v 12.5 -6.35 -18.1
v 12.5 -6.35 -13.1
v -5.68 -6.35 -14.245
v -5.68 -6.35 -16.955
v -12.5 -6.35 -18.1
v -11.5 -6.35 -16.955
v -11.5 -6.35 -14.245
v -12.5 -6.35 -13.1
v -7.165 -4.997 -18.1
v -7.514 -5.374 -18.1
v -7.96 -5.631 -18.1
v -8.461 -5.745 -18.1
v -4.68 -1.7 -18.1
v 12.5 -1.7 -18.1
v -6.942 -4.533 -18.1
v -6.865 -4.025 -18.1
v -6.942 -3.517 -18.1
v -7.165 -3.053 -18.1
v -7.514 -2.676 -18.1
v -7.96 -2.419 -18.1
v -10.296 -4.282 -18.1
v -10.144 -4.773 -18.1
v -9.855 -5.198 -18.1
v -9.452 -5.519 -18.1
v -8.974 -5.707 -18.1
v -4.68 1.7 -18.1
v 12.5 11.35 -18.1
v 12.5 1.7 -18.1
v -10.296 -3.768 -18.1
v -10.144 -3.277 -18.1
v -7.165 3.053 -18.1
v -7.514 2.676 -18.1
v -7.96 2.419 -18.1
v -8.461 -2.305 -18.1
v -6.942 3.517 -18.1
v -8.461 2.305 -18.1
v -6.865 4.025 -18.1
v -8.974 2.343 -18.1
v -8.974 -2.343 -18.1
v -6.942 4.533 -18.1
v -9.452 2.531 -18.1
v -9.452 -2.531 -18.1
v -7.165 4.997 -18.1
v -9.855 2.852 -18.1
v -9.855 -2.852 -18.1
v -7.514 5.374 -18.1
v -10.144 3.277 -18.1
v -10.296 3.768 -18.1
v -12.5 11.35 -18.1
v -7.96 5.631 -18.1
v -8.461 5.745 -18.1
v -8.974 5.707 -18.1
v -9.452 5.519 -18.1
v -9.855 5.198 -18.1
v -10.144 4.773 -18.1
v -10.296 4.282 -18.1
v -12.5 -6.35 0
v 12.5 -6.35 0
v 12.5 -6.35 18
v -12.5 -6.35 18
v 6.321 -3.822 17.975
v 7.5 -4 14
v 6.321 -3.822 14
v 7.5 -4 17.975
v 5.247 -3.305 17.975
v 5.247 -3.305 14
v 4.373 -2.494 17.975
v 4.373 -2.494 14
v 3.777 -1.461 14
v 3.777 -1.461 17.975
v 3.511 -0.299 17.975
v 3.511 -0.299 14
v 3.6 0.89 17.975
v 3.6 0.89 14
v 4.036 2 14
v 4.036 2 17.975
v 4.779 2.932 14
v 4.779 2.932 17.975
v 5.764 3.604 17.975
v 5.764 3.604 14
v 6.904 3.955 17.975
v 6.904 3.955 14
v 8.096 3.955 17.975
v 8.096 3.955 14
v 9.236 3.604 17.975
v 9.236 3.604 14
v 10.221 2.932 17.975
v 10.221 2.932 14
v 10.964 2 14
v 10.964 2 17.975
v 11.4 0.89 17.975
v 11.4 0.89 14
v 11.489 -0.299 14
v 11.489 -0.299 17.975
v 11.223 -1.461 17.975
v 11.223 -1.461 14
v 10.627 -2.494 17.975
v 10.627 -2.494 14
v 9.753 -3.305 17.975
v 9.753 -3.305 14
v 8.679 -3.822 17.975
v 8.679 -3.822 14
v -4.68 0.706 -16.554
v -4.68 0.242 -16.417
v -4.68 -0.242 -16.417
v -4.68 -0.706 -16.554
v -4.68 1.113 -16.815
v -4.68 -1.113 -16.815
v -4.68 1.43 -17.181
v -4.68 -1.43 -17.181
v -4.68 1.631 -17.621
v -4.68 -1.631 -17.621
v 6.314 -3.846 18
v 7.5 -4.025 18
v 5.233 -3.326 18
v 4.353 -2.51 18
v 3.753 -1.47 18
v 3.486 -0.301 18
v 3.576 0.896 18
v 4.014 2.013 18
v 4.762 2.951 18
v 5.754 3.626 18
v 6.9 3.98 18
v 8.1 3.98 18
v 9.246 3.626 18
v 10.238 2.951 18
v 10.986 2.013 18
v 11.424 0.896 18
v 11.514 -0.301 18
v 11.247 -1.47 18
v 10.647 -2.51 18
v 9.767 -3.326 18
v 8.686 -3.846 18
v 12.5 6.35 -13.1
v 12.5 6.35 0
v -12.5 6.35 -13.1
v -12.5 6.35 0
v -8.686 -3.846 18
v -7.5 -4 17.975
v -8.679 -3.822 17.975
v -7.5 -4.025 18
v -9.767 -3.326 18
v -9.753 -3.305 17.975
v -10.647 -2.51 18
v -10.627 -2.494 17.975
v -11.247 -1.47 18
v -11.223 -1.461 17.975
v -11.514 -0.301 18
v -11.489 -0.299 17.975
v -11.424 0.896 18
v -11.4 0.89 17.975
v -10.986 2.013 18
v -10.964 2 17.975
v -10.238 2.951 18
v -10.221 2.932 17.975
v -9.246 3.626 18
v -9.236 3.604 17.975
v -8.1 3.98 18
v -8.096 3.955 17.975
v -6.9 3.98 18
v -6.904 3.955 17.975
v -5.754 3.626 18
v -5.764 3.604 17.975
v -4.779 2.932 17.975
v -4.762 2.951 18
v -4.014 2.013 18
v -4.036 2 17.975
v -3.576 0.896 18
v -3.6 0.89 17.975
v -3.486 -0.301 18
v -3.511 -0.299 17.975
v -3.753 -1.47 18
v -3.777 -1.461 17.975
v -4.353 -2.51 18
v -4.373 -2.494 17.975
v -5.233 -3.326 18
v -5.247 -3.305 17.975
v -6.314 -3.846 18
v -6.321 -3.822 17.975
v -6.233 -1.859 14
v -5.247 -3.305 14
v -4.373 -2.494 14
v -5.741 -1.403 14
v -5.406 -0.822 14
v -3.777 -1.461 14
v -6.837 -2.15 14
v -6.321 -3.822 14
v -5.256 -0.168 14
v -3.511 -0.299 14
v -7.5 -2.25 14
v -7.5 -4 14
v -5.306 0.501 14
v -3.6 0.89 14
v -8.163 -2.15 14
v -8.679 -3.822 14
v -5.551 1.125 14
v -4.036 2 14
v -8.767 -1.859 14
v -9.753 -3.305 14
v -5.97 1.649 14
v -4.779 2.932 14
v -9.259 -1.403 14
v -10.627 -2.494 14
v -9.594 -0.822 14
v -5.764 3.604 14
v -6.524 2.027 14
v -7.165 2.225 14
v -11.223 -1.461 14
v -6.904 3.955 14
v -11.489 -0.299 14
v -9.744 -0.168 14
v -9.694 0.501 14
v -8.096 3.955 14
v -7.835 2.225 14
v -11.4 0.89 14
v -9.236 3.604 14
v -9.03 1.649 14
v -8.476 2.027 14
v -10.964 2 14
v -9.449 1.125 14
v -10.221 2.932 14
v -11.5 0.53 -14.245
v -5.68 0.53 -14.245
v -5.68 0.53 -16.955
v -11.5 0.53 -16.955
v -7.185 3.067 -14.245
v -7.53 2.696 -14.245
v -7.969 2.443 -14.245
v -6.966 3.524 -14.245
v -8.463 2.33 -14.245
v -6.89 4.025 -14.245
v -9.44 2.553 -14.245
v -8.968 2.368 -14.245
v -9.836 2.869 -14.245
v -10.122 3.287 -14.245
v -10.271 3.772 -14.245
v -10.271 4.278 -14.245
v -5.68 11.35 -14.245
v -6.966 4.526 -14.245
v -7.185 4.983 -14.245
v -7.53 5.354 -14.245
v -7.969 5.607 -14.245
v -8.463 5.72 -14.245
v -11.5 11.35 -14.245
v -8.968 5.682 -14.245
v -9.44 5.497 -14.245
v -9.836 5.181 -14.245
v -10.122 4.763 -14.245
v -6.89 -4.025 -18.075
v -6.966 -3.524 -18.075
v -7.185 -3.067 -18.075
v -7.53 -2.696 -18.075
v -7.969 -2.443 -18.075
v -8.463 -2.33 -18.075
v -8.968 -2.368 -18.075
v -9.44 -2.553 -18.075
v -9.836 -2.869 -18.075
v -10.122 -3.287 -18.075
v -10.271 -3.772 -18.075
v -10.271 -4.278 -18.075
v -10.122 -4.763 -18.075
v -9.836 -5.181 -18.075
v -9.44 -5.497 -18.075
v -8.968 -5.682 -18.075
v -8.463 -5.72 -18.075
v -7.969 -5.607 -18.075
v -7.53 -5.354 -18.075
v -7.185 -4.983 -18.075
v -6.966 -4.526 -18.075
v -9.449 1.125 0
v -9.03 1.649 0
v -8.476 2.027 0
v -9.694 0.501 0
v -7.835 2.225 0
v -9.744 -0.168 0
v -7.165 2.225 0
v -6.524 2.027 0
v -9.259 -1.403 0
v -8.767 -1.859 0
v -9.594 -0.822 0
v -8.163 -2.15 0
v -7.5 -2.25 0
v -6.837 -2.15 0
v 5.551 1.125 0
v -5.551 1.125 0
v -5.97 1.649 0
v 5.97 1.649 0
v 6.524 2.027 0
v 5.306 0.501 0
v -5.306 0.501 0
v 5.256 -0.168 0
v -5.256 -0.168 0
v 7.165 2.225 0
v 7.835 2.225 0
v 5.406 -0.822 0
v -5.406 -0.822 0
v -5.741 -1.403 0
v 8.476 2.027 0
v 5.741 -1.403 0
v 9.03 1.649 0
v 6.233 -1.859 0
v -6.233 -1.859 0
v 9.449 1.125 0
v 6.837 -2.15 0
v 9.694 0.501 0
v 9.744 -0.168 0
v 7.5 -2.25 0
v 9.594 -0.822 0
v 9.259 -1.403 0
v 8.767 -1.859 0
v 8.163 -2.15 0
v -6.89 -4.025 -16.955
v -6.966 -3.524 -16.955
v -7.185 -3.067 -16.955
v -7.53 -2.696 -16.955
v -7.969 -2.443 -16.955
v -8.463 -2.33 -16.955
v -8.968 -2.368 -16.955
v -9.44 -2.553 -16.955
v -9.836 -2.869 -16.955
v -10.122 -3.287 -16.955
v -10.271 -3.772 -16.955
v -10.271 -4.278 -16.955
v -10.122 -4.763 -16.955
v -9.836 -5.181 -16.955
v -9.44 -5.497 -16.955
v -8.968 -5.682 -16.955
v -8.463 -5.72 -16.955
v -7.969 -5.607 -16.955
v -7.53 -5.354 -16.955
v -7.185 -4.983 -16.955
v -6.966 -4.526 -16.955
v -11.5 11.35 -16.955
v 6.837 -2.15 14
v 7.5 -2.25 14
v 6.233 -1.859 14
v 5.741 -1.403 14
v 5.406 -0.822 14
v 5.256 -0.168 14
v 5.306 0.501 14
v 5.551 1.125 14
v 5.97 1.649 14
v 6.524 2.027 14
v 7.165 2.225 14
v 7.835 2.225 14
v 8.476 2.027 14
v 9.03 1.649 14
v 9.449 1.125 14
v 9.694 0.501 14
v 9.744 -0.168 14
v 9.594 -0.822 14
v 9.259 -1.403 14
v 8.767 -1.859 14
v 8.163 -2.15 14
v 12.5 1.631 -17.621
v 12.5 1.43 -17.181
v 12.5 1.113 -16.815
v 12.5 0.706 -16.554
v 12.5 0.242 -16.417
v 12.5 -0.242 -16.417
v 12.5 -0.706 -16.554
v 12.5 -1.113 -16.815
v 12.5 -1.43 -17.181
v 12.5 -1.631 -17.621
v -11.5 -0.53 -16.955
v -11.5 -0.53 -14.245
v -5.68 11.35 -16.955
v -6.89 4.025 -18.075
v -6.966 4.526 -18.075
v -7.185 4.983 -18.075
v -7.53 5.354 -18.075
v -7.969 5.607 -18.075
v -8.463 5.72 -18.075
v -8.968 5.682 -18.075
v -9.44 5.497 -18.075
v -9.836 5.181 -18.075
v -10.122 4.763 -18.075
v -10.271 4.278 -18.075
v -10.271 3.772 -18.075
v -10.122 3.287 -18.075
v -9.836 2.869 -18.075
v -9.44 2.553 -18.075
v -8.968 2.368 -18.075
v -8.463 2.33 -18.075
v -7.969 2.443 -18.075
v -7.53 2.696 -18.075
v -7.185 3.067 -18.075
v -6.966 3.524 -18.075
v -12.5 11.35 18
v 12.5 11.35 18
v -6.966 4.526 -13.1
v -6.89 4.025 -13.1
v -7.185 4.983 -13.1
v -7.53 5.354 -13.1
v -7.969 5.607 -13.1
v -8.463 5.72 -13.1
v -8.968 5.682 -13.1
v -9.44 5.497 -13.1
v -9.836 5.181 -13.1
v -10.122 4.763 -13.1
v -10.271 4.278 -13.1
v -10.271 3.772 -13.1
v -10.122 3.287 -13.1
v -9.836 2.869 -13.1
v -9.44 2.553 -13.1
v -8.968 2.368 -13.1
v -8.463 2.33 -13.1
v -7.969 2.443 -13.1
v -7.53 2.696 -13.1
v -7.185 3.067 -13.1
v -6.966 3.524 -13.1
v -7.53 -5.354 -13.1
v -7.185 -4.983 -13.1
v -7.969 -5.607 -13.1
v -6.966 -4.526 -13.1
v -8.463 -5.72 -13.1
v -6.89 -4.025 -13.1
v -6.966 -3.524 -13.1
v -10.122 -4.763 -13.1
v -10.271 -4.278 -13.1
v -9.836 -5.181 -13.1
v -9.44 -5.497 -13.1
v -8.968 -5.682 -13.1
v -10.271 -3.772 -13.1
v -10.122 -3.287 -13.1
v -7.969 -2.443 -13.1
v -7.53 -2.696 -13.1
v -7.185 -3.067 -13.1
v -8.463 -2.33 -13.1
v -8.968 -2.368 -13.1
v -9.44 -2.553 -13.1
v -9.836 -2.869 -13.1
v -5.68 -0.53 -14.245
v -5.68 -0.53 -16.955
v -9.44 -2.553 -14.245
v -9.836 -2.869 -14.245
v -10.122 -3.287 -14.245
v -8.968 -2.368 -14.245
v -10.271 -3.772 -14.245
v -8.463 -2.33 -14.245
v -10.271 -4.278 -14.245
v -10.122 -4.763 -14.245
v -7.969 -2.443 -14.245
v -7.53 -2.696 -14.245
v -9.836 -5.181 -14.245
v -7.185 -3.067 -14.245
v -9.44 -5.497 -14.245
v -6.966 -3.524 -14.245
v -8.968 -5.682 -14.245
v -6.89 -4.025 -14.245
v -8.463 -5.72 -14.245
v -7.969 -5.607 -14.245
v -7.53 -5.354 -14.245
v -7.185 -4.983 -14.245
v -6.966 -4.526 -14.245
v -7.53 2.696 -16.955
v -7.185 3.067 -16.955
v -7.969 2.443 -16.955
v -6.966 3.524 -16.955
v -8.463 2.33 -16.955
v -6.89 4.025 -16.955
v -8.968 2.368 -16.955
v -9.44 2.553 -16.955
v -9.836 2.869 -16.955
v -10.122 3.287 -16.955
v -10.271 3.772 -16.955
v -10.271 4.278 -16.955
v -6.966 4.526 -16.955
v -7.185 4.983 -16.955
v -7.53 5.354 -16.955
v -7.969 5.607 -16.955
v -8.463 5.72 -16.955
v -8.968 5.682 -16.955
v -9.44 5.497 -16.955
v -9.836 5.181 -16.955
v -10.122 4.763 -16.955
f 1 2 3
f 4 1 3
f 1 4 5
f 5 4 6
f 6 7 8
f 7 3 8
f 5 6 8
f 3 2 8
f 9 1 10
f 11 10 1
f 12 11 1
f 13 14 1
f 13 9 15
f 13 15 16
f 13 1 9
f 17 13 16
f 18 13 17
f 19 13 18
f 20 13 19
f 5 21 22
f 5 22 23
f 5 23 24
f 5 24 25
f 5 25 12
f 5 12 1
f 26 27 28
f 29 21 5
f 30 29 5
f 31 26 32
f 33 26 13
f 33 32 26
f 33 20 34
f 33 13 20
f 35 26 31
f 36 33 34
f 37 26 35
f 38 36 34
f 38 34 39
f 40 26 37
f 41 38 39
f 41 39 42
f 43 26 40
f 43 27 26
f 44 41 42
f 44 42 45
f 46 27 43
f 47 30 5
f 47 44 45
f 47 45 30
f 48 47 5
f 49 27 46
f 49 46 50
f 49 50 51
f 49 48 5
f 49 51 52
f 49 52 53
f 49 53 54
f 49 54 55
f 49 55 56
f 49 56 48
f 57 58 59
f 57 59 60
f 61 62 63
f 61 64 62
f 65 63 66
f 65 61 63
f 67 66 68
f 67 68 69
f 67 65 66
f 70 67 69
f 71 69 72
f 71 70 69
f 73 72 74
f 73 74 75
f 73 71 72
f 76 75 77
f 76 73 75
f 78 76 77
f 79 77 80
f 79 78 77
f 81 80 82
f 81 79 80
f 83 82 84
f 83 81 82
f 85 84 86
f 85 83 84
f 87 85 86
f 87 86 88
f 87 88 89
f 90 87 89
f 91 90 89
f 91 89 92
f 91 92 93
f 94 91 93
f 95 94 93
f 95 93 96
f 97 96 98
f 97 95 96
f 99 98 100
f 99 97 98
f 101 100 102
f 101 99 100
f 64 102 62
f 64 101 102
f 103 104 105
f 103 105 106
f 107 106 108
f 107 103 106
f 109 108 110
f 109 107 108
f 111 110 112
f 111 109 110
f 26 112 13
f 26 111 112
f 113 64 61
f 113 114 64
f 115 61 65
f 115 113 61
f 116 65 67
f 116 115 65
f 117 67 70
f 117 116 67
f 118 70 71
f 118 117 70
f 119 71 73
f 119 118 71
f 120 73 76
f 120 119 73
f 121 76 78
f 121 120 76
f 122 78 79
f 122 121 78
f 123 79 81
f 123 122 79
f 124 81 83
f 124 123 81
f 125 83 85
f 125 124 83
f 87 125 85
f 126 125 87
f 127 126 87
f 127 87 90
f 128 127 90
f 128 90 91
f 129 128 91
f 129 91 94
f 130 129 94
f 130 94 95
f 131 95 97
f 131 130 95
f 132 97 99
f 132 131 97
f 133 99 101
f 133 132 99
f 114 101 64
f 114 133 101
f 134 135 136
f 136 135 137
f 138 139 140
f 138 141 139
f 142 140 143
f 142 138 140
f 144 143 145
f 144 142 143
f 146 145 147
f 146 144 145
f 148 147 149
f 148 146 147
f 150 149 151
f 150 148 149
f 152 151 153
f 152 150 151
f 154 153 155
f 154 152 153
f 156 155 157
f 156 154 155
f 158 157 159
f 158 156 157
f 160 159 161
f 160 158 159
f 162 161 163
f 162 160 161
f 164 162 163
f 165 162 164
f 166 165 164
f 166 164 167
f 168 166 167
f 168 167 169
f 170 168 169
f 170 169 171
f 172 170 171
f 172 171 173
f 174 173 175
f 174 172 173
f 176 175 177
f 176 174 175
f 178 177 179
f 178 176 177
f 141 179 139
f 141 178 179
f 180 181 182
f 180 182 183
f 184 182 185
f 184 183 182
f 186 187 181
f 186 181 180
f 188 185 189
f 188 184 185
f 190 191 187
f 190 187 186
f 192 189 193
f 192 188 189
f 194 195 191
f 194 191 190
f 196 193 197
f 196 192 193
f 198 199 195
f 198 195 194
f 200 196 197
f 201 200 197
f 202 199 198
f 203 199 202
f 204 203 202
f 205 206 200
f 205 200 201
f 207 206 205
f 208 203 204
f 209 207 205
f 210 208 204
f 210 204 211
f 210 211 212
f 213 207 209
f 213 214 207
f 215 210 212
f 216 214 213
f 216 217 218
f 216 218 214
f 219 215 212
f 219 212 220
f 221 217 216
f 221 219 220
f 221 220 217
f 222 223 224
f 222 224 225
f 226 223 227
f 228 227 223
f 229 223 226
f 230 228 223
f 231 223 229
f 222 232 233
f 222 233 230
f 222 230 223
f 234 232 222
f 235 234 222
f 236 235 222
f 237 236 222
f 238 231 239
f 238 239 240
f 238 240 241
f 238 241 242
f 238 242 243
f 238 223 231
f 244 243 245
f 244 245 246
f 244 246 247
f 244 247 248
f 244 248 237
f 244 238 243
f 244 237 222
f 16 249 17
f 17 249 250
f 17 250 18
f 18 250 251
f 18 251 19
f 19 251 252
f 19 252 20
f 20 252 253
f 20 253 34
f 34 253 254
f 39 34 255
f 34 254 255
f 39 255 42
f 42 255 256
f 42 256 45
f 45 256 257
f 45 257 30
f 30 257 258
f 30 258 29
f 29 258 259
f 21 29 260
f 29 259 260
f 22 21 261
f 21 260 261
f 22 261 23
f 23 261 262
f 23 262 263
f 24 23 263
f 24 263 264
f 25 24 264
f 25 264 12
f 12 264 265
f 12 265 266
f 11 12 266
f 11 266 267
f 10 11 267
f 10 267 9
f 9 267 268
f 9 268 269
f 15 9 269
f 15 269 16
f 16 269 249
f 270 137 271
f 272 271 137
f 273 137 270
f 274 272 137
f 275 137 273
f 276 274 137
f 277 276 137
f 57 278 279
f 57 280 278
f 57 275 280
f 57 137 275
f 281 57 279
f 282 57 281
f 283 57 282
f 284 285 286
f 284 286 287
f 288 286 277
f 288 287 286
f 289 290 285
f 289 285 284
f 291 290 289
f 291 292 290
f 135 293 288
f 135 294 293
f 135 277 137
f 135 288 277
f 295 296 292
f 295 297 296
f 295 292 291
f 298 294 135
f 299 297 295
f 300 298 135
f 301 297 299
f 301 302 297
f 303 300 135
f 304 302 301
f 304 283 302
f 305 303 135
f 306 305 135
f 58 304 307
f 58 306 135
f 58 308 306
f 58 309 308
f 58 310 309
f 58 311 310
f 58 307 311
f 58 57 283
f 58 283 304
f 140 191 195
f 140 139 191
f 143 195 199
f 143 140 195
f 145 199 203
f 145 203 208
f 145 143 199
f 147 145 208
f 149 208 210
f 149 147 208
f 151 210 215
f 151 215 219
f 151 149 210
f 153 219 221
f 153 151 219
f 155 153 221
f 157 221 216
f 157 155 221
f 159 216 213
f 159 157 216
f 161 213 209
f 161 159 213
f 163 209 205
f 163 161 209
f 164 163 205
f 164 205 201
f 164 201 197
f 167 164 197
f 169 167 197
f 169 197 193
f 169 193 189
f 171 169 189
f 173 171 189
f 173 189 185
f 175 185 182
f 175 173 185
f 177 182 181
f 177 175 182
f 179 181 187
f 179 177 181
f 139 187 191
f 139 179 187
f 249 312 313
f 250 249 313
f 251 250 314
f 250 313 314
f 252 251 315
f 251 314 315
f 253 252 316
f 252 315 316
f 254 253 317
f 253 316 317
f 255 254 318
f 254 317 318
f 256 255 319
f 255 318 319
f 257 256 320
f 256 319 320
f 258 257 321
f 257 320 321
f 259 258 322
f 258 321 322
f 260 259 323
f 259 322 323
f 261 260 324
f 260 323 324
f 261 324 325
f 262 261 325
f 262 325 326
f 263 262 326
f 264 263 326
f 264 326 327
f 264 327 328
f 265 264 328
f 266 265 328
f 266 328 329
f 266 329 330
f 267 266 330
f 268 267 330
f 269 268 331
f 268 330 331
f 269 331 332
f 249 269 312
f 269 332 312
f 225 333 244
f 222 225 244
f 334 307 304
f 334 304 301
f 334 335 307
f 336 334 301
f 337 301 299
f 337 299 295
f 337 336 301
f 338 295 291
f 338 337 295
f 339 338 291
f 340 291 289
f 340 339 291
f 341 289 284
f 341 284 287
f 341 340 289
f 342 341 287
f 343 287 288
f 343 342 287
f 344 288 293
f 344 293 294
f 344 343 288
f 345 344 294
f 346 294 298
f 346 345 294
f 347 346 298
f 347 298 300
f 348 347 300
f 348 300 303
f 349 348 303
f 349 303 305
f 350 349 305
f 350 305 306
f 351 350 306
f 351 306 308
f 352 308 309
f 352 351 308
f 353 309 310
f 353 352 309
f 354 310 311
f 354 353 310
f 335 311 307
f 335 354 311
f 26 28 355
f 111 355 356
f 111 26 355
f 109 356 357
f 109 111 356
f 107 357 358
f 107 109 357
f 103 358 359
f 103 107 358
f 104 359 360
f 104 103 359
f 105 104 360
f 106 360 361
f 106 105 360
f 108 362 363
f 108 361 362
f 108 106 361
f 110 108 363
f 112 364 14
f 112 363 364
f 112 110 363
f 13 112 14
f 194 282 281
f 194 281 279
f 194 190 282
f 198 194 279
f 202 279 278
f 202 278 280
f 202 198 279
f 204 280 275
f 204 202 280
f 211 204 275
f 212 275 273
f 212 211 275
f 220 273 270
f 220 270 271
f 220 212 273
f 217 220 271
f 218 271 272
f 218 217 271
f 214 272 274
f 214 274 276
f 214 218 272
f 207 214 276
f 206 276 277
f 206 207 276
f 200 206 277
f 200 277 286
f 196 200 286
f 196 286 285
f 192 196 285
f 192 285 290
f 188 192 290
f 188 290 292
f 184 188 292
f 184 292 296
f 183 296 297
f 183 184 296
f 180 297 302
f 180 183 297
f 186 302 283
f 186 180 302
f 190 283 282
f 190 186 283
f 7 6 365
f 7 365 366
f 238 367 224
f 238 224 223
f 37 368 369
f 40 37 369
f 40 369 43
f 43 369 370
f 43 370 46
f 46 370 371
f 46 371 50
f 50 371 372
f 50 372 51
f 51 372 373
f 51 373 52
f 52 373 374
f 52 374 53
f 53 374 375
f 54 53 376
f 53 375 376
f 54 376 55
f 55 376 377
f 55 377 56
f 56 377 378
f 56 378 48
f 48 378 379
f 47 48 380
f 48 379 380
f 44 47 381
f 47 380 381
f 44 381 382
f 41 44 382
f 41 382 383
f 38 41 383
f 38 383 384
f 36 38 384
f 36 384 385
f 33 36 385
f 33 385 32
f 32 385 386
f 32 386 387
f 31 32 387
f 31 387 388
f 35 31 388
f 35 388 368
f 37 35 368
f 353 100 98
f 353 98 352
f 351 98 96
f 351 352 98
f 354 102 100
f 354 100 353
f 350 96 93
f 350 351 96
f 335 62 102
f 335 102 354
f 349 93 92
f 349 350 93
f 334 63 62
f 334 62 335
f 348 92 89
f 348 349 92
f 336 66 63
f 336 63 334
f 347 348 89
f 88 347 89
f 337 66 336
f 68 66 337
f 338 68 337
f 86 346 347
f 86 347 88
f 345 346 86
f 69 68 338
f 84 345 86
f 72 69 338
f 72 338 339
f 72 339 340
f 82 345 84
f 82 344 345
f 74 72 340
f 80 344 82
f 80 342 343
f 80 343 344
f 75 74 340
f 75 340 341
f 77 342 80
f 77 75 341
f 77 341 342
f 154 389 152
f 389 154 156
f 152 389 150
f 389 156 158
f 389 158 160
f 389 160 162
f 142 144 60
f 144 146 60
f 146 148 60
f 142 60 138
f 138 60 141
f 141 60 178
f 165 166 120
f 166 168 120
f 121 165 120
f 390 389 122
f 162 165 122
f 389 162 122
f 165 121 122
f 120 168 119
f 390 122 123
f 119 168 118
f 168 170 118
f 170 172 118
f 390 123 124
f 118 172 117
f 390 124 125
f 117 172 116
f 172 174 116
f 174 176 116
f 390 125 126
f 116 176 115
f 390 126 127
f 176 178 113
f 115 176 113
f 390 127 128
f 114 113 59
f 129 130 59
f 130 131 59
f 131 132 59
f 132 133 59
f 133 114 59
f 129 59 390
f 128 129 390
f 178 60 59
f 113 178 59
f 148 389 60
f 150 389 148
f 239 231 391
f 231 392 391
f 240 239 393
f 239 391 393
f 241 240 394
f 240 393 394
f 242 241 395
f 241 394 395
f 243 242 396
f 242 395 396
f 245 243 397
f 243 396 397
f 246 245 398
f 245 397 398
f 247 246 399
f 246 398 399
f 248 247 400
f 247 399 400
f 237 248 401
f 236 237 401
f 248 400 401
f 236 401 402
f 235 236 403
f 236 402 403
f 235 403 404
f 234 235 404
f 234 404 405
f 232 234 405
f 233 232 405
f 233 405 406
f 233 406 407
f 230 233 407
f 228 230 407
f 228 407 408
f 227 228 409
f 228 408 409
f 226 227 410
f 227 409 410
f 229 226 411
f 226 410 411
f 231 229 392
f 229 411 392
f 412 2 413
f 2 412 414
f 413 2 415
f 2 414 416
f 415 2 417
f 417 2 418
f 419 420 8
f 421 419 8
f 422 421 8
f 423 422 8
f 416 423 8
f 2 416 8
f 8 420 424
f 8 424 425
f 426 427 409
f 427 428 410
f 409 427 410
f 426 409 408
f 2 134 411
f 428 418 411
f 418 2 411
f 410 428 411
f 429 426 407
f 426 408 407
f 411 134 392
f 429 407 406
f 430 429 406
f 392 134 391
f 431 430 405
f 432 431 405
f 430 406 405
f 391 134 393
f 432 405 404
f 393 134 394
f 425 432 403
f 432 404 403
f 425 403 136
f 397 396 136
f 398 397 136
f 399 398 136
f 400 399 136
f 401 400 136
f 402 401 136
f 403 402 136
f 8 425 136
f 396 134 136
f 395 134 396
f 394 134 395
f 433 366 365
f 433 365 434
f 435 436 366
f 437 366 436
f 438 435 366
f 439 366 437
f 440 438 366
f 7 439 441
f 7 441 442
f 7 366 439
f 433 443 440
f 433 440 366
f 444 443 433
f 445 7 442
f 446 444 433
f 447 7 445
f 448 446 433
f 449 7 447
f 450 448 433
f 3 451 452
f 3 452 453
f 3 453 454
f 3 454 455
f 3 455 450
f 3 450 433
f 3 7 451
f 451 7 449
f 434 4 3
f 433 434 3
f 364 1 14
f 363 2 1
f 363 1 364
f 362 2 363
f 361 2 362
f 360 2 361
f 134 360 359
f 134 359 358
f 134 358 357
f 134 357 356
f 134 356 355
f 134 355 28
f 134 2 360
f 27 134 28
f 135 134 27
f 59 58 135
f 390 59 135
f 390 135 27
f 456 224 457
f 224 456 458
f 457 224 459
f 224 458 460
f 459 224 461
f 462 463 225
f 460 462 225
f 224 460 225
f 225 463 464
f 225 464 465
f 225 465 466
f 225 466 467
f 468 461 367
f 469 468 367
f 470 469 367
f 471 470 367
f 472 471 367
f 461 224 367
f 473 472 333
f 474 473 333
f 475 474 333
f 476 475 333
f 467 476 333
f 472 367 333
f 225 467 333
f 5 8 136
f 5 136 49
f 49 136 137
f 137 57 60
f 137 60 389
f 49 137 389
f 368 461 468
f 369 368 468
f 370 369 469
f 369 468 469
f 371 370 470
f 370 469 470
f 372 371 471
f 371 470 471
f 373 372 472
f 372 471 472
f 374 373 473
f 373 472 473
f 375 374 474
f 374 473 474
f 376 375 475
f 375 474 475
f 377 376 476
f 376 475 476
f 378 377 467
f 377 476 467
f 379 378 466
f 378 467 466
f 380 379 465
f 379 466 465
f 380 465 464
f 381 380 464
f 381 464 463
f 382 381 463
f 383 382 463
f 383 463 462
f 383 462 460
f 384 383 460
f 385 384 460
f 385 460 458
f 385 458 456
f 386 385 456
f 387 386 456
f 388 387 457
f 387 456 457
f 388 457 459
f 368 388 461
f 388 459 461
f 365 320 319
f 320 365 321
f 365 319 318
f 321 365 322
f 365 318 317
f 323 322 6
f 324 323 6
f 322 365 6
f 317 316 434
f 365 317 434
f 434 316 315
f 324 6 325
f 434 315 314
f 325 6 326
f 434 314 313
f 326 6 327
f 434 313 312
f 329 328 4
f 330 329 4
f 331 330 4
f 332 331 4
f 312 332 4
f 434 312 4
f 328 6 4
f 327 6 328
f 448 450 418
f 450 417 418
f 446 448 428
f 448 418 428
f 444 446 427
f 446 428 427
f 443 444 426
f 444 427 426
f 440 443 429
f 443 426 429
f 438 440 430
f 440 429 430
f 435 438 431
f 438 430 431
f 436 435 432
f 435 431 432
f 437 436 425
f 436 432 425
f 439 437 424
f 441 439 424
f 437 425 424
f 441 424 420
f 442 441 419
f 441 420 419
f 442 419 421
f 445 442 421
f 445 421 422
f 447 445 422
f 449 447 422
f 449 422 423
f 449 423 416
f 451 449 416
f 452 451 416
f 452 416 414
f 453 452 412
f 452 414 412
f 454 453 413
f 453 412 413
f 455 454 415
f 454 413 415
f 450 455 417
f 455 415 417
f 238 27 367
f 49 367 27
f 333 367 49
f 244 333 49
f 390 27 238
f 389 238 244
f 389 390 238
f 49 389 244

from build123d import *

# Parameters (mm, degrees)
SKETCH10_W                     = 25
SKETCH10_H                     = 12.7
BOSS_EXTRUDE3_DEPTH            = 18
CBORE_FOR_M4_SHCS1_AT_2_COUNT  = 2
CBORE_FOR_M4_SHCS1_AT_2_PITCH  = 15
SKETCH19_W                     = 25
SKETCH19_H                     = 18
BOSS_EXTRUDE6_DEPTH            = 5
SKETCH20_W                     = 25
SKETCH20_H                     = 5
BOSS_EXTRUDE7_DEPTH            = 13.1
SKETCH21_W                     = 25
SKETCH21_H                     = 17.7
BOSS_EXTRUDE8_DEPTH            = 5
CUT_EXTRUDE1_DEPTH             = 33.885141021
CUT_EXTRUDE1_DEPTH_BACK        = 17.18
M3_CLEARANCE_HOLE6_D           = 3.4
M3_CLEARANCE_HOLE6_DEPTH       = 5
M3_CLEARANCE_HOLE6_CSINK_D     = 3.45
M3_CLEARANCE_HOLE6_CSINK_ANGLE = 90
M3_CLEARANCE_HOLE6_TIP         = 1.021463052
SKETCH27_W                     = 5.82
SKETCH27_H                     = 2.71
CUT_EXTRUDE2_DEPTH             = 5.82
SKETCH28_W                     = 5.82
SKETCH28_H                     = 2.71
CUT_EXTRUDE3_DEPTH             = 10.82


with BuildPart() as part:
    # Sketch10 → Boss-Extrude3 (new body)
    with BuildSketch(Plane(origin=(0, 0, 0), x_dir=(-1, 0, 0), z_dir=(0, 0, -1))):
        Rectangle(SKETCH10_W, SKETCH10_H)
    extrude(amount=-BOSS_EXTRUDE3_DEPTH)

    # Sketch17 → CBORE for M4 SHCS1 (revolve, cut)
    with BuildSketch(Plane(origin=(7.5, 0, 18), x_dir=(0, -1, 0), z_dir=(1, 0, 0))):
        Polygon((0, 0), (0, 18), (2.25, 18), (2.25, 4), (4, 4), (4, 0.025), (4.025, 0), align=None)
    cbore_for_m4_shcs1 = revolve(axis=Axis((7.5, 0, 24.35), (0, 0, -1)), mode=Mode.SUBTRACT)

    # CBORE for M4 SHCS1 at 2: CBORE for M4 SHCS1 ×2
    with Locations(*[(-i * CBORE_FOR_M4_SHCS1_AT_2_PITCH, 0, 0) for i in range(1, CBORE_FOR_M4_SHCS1_AT_2_COUNT)]):
        add(cbore_for_m4_shcs1, mode=Mode.SUBTRACT)

    # Sketch19 → Boss-Extrude6 (add)
    with BuildSketch(Plane(origin=(0, 6.35, 0), x_dir=(1, 0, 0), z_dir=(0, 1, 0))):
        with Locations((0, -9)):
            Rectangle(SKETCH19_W, SKETCH19_H)
    extrude(amount=BOSS_EXTRUDE6_DEPTH)

    # Sketch20 → Boss-Extrude7 (add)
    with BuildSketch(Plane(origin=(0, 0, 0), x_dir=(-1, 0, 0), z_dir=(0, 0, -1))):
        with Locations((0, 8.85)):
            Rectangle(SKETCH20_W, SKETCH20_H)
    extrude(amount=BOSS_EXTRUDE7_DEPTH)

    # Sketch21 → Boss-Extrude8 (add)
    with BuildSketch(Plane(origin=(0, 0, -13.1), x_dir=(-1, 0, 0), z_dir=(0, 0, -1))):
        with Locations((0, 2.5)):
            Rectangle(SKETCH21_W, SKETCH21_H)
    extrude(amount=BOSS_EXTRUDE8_DEPTH)

    # Sketch22 → Cut-Extrude1 (cut, two sides: drawn at the far end of the back side and taken through both)
    with BuildSketch(Plane(origin=(12.5, 0, 0), x_dir=(0, 0, -1), z_dir=(1, 0, 0)).offset(-CUT_EXTRUDE1_DEPTH_BACK)):
        with BuildLine():
            Line((104.872716508, 1.7), (18.1, 1.7))
            ThreePointArc((18.1, 1.7), (16.4, 0), (18.1, -1.7))
            Line((18.1, -1.7), (104.872716508, -1.7))
            Line((104.872716508, -1.7), (278.418149524, -1.7))
            Line((278.418149524, -1.7), (278.418149524, 1.7))
            Line((278.418149524, 1.7), (104.872716508, 1.7))
        make_face()
    extrude(amount=CUT_EXTRUDE1_DEPTH + CUT_EXTRUDE1_DEPTH_BACK, mode=Mode.SUBTRACT)

    # M3 Clearance Hole6
    with Locations(Plane(origin=(0, 0, -18.1), x_dir=(-1, 0, 0), z_dir=(0, 0, -1))):
        with Locations((8.59, 4.025), (8.59, -4.025)):
            CounterSinkHole(M3_CLEARANCE_HOLE6_D / 2, M3_CLEARANCE_HOLE6_CSINK_D / 2, depth=M3_CLEARANCE_HOLE6_DEPTH, counter_sink_angle=M3_CLEARANCE_HOLE6_CSINK_ANGLE)
            with Locations((0, 0, -(M3_CLEARANCE_HOLE6_DEPTH + M3_CLEARANCE_HOLE6_TIP / 2))):  # 118° drill point
                Cone(0, M3_CLEARANCE_HOLE6_D / 2, M3_CLEARANCE_HOLE6_TIP, mode=Mode.SUBTRACT)

    # Sketch27 → Cut-Extrude2 (cut)
    with BuildSketch(Plane.XZ.offset(6.35)):
        with Locations((-8.59, -15.6)):
            Rectangle(SKETCH27_W, SKETCH27_H)
    extrude(amount=-CUT_EXTRUDE2_DEPTH, mode=Mode.SUBTRACT)

    # Sketch28 → Cut-Extrude3 (cut)
    with BuildSketch(Plane(origin=(0, 11.35, 11.35), x_dir=(-1, 0, 0), z_dir=(0, 1, 0))):
        with Locations((8.59, -26.95)):
            Rectangle(SKETCH28_W, SKETCH28_H)
    extrude(amount=-CUT_EXTRUDE3_DEPTH, mode=Mode.SUBTRACT)


solid = part.part
